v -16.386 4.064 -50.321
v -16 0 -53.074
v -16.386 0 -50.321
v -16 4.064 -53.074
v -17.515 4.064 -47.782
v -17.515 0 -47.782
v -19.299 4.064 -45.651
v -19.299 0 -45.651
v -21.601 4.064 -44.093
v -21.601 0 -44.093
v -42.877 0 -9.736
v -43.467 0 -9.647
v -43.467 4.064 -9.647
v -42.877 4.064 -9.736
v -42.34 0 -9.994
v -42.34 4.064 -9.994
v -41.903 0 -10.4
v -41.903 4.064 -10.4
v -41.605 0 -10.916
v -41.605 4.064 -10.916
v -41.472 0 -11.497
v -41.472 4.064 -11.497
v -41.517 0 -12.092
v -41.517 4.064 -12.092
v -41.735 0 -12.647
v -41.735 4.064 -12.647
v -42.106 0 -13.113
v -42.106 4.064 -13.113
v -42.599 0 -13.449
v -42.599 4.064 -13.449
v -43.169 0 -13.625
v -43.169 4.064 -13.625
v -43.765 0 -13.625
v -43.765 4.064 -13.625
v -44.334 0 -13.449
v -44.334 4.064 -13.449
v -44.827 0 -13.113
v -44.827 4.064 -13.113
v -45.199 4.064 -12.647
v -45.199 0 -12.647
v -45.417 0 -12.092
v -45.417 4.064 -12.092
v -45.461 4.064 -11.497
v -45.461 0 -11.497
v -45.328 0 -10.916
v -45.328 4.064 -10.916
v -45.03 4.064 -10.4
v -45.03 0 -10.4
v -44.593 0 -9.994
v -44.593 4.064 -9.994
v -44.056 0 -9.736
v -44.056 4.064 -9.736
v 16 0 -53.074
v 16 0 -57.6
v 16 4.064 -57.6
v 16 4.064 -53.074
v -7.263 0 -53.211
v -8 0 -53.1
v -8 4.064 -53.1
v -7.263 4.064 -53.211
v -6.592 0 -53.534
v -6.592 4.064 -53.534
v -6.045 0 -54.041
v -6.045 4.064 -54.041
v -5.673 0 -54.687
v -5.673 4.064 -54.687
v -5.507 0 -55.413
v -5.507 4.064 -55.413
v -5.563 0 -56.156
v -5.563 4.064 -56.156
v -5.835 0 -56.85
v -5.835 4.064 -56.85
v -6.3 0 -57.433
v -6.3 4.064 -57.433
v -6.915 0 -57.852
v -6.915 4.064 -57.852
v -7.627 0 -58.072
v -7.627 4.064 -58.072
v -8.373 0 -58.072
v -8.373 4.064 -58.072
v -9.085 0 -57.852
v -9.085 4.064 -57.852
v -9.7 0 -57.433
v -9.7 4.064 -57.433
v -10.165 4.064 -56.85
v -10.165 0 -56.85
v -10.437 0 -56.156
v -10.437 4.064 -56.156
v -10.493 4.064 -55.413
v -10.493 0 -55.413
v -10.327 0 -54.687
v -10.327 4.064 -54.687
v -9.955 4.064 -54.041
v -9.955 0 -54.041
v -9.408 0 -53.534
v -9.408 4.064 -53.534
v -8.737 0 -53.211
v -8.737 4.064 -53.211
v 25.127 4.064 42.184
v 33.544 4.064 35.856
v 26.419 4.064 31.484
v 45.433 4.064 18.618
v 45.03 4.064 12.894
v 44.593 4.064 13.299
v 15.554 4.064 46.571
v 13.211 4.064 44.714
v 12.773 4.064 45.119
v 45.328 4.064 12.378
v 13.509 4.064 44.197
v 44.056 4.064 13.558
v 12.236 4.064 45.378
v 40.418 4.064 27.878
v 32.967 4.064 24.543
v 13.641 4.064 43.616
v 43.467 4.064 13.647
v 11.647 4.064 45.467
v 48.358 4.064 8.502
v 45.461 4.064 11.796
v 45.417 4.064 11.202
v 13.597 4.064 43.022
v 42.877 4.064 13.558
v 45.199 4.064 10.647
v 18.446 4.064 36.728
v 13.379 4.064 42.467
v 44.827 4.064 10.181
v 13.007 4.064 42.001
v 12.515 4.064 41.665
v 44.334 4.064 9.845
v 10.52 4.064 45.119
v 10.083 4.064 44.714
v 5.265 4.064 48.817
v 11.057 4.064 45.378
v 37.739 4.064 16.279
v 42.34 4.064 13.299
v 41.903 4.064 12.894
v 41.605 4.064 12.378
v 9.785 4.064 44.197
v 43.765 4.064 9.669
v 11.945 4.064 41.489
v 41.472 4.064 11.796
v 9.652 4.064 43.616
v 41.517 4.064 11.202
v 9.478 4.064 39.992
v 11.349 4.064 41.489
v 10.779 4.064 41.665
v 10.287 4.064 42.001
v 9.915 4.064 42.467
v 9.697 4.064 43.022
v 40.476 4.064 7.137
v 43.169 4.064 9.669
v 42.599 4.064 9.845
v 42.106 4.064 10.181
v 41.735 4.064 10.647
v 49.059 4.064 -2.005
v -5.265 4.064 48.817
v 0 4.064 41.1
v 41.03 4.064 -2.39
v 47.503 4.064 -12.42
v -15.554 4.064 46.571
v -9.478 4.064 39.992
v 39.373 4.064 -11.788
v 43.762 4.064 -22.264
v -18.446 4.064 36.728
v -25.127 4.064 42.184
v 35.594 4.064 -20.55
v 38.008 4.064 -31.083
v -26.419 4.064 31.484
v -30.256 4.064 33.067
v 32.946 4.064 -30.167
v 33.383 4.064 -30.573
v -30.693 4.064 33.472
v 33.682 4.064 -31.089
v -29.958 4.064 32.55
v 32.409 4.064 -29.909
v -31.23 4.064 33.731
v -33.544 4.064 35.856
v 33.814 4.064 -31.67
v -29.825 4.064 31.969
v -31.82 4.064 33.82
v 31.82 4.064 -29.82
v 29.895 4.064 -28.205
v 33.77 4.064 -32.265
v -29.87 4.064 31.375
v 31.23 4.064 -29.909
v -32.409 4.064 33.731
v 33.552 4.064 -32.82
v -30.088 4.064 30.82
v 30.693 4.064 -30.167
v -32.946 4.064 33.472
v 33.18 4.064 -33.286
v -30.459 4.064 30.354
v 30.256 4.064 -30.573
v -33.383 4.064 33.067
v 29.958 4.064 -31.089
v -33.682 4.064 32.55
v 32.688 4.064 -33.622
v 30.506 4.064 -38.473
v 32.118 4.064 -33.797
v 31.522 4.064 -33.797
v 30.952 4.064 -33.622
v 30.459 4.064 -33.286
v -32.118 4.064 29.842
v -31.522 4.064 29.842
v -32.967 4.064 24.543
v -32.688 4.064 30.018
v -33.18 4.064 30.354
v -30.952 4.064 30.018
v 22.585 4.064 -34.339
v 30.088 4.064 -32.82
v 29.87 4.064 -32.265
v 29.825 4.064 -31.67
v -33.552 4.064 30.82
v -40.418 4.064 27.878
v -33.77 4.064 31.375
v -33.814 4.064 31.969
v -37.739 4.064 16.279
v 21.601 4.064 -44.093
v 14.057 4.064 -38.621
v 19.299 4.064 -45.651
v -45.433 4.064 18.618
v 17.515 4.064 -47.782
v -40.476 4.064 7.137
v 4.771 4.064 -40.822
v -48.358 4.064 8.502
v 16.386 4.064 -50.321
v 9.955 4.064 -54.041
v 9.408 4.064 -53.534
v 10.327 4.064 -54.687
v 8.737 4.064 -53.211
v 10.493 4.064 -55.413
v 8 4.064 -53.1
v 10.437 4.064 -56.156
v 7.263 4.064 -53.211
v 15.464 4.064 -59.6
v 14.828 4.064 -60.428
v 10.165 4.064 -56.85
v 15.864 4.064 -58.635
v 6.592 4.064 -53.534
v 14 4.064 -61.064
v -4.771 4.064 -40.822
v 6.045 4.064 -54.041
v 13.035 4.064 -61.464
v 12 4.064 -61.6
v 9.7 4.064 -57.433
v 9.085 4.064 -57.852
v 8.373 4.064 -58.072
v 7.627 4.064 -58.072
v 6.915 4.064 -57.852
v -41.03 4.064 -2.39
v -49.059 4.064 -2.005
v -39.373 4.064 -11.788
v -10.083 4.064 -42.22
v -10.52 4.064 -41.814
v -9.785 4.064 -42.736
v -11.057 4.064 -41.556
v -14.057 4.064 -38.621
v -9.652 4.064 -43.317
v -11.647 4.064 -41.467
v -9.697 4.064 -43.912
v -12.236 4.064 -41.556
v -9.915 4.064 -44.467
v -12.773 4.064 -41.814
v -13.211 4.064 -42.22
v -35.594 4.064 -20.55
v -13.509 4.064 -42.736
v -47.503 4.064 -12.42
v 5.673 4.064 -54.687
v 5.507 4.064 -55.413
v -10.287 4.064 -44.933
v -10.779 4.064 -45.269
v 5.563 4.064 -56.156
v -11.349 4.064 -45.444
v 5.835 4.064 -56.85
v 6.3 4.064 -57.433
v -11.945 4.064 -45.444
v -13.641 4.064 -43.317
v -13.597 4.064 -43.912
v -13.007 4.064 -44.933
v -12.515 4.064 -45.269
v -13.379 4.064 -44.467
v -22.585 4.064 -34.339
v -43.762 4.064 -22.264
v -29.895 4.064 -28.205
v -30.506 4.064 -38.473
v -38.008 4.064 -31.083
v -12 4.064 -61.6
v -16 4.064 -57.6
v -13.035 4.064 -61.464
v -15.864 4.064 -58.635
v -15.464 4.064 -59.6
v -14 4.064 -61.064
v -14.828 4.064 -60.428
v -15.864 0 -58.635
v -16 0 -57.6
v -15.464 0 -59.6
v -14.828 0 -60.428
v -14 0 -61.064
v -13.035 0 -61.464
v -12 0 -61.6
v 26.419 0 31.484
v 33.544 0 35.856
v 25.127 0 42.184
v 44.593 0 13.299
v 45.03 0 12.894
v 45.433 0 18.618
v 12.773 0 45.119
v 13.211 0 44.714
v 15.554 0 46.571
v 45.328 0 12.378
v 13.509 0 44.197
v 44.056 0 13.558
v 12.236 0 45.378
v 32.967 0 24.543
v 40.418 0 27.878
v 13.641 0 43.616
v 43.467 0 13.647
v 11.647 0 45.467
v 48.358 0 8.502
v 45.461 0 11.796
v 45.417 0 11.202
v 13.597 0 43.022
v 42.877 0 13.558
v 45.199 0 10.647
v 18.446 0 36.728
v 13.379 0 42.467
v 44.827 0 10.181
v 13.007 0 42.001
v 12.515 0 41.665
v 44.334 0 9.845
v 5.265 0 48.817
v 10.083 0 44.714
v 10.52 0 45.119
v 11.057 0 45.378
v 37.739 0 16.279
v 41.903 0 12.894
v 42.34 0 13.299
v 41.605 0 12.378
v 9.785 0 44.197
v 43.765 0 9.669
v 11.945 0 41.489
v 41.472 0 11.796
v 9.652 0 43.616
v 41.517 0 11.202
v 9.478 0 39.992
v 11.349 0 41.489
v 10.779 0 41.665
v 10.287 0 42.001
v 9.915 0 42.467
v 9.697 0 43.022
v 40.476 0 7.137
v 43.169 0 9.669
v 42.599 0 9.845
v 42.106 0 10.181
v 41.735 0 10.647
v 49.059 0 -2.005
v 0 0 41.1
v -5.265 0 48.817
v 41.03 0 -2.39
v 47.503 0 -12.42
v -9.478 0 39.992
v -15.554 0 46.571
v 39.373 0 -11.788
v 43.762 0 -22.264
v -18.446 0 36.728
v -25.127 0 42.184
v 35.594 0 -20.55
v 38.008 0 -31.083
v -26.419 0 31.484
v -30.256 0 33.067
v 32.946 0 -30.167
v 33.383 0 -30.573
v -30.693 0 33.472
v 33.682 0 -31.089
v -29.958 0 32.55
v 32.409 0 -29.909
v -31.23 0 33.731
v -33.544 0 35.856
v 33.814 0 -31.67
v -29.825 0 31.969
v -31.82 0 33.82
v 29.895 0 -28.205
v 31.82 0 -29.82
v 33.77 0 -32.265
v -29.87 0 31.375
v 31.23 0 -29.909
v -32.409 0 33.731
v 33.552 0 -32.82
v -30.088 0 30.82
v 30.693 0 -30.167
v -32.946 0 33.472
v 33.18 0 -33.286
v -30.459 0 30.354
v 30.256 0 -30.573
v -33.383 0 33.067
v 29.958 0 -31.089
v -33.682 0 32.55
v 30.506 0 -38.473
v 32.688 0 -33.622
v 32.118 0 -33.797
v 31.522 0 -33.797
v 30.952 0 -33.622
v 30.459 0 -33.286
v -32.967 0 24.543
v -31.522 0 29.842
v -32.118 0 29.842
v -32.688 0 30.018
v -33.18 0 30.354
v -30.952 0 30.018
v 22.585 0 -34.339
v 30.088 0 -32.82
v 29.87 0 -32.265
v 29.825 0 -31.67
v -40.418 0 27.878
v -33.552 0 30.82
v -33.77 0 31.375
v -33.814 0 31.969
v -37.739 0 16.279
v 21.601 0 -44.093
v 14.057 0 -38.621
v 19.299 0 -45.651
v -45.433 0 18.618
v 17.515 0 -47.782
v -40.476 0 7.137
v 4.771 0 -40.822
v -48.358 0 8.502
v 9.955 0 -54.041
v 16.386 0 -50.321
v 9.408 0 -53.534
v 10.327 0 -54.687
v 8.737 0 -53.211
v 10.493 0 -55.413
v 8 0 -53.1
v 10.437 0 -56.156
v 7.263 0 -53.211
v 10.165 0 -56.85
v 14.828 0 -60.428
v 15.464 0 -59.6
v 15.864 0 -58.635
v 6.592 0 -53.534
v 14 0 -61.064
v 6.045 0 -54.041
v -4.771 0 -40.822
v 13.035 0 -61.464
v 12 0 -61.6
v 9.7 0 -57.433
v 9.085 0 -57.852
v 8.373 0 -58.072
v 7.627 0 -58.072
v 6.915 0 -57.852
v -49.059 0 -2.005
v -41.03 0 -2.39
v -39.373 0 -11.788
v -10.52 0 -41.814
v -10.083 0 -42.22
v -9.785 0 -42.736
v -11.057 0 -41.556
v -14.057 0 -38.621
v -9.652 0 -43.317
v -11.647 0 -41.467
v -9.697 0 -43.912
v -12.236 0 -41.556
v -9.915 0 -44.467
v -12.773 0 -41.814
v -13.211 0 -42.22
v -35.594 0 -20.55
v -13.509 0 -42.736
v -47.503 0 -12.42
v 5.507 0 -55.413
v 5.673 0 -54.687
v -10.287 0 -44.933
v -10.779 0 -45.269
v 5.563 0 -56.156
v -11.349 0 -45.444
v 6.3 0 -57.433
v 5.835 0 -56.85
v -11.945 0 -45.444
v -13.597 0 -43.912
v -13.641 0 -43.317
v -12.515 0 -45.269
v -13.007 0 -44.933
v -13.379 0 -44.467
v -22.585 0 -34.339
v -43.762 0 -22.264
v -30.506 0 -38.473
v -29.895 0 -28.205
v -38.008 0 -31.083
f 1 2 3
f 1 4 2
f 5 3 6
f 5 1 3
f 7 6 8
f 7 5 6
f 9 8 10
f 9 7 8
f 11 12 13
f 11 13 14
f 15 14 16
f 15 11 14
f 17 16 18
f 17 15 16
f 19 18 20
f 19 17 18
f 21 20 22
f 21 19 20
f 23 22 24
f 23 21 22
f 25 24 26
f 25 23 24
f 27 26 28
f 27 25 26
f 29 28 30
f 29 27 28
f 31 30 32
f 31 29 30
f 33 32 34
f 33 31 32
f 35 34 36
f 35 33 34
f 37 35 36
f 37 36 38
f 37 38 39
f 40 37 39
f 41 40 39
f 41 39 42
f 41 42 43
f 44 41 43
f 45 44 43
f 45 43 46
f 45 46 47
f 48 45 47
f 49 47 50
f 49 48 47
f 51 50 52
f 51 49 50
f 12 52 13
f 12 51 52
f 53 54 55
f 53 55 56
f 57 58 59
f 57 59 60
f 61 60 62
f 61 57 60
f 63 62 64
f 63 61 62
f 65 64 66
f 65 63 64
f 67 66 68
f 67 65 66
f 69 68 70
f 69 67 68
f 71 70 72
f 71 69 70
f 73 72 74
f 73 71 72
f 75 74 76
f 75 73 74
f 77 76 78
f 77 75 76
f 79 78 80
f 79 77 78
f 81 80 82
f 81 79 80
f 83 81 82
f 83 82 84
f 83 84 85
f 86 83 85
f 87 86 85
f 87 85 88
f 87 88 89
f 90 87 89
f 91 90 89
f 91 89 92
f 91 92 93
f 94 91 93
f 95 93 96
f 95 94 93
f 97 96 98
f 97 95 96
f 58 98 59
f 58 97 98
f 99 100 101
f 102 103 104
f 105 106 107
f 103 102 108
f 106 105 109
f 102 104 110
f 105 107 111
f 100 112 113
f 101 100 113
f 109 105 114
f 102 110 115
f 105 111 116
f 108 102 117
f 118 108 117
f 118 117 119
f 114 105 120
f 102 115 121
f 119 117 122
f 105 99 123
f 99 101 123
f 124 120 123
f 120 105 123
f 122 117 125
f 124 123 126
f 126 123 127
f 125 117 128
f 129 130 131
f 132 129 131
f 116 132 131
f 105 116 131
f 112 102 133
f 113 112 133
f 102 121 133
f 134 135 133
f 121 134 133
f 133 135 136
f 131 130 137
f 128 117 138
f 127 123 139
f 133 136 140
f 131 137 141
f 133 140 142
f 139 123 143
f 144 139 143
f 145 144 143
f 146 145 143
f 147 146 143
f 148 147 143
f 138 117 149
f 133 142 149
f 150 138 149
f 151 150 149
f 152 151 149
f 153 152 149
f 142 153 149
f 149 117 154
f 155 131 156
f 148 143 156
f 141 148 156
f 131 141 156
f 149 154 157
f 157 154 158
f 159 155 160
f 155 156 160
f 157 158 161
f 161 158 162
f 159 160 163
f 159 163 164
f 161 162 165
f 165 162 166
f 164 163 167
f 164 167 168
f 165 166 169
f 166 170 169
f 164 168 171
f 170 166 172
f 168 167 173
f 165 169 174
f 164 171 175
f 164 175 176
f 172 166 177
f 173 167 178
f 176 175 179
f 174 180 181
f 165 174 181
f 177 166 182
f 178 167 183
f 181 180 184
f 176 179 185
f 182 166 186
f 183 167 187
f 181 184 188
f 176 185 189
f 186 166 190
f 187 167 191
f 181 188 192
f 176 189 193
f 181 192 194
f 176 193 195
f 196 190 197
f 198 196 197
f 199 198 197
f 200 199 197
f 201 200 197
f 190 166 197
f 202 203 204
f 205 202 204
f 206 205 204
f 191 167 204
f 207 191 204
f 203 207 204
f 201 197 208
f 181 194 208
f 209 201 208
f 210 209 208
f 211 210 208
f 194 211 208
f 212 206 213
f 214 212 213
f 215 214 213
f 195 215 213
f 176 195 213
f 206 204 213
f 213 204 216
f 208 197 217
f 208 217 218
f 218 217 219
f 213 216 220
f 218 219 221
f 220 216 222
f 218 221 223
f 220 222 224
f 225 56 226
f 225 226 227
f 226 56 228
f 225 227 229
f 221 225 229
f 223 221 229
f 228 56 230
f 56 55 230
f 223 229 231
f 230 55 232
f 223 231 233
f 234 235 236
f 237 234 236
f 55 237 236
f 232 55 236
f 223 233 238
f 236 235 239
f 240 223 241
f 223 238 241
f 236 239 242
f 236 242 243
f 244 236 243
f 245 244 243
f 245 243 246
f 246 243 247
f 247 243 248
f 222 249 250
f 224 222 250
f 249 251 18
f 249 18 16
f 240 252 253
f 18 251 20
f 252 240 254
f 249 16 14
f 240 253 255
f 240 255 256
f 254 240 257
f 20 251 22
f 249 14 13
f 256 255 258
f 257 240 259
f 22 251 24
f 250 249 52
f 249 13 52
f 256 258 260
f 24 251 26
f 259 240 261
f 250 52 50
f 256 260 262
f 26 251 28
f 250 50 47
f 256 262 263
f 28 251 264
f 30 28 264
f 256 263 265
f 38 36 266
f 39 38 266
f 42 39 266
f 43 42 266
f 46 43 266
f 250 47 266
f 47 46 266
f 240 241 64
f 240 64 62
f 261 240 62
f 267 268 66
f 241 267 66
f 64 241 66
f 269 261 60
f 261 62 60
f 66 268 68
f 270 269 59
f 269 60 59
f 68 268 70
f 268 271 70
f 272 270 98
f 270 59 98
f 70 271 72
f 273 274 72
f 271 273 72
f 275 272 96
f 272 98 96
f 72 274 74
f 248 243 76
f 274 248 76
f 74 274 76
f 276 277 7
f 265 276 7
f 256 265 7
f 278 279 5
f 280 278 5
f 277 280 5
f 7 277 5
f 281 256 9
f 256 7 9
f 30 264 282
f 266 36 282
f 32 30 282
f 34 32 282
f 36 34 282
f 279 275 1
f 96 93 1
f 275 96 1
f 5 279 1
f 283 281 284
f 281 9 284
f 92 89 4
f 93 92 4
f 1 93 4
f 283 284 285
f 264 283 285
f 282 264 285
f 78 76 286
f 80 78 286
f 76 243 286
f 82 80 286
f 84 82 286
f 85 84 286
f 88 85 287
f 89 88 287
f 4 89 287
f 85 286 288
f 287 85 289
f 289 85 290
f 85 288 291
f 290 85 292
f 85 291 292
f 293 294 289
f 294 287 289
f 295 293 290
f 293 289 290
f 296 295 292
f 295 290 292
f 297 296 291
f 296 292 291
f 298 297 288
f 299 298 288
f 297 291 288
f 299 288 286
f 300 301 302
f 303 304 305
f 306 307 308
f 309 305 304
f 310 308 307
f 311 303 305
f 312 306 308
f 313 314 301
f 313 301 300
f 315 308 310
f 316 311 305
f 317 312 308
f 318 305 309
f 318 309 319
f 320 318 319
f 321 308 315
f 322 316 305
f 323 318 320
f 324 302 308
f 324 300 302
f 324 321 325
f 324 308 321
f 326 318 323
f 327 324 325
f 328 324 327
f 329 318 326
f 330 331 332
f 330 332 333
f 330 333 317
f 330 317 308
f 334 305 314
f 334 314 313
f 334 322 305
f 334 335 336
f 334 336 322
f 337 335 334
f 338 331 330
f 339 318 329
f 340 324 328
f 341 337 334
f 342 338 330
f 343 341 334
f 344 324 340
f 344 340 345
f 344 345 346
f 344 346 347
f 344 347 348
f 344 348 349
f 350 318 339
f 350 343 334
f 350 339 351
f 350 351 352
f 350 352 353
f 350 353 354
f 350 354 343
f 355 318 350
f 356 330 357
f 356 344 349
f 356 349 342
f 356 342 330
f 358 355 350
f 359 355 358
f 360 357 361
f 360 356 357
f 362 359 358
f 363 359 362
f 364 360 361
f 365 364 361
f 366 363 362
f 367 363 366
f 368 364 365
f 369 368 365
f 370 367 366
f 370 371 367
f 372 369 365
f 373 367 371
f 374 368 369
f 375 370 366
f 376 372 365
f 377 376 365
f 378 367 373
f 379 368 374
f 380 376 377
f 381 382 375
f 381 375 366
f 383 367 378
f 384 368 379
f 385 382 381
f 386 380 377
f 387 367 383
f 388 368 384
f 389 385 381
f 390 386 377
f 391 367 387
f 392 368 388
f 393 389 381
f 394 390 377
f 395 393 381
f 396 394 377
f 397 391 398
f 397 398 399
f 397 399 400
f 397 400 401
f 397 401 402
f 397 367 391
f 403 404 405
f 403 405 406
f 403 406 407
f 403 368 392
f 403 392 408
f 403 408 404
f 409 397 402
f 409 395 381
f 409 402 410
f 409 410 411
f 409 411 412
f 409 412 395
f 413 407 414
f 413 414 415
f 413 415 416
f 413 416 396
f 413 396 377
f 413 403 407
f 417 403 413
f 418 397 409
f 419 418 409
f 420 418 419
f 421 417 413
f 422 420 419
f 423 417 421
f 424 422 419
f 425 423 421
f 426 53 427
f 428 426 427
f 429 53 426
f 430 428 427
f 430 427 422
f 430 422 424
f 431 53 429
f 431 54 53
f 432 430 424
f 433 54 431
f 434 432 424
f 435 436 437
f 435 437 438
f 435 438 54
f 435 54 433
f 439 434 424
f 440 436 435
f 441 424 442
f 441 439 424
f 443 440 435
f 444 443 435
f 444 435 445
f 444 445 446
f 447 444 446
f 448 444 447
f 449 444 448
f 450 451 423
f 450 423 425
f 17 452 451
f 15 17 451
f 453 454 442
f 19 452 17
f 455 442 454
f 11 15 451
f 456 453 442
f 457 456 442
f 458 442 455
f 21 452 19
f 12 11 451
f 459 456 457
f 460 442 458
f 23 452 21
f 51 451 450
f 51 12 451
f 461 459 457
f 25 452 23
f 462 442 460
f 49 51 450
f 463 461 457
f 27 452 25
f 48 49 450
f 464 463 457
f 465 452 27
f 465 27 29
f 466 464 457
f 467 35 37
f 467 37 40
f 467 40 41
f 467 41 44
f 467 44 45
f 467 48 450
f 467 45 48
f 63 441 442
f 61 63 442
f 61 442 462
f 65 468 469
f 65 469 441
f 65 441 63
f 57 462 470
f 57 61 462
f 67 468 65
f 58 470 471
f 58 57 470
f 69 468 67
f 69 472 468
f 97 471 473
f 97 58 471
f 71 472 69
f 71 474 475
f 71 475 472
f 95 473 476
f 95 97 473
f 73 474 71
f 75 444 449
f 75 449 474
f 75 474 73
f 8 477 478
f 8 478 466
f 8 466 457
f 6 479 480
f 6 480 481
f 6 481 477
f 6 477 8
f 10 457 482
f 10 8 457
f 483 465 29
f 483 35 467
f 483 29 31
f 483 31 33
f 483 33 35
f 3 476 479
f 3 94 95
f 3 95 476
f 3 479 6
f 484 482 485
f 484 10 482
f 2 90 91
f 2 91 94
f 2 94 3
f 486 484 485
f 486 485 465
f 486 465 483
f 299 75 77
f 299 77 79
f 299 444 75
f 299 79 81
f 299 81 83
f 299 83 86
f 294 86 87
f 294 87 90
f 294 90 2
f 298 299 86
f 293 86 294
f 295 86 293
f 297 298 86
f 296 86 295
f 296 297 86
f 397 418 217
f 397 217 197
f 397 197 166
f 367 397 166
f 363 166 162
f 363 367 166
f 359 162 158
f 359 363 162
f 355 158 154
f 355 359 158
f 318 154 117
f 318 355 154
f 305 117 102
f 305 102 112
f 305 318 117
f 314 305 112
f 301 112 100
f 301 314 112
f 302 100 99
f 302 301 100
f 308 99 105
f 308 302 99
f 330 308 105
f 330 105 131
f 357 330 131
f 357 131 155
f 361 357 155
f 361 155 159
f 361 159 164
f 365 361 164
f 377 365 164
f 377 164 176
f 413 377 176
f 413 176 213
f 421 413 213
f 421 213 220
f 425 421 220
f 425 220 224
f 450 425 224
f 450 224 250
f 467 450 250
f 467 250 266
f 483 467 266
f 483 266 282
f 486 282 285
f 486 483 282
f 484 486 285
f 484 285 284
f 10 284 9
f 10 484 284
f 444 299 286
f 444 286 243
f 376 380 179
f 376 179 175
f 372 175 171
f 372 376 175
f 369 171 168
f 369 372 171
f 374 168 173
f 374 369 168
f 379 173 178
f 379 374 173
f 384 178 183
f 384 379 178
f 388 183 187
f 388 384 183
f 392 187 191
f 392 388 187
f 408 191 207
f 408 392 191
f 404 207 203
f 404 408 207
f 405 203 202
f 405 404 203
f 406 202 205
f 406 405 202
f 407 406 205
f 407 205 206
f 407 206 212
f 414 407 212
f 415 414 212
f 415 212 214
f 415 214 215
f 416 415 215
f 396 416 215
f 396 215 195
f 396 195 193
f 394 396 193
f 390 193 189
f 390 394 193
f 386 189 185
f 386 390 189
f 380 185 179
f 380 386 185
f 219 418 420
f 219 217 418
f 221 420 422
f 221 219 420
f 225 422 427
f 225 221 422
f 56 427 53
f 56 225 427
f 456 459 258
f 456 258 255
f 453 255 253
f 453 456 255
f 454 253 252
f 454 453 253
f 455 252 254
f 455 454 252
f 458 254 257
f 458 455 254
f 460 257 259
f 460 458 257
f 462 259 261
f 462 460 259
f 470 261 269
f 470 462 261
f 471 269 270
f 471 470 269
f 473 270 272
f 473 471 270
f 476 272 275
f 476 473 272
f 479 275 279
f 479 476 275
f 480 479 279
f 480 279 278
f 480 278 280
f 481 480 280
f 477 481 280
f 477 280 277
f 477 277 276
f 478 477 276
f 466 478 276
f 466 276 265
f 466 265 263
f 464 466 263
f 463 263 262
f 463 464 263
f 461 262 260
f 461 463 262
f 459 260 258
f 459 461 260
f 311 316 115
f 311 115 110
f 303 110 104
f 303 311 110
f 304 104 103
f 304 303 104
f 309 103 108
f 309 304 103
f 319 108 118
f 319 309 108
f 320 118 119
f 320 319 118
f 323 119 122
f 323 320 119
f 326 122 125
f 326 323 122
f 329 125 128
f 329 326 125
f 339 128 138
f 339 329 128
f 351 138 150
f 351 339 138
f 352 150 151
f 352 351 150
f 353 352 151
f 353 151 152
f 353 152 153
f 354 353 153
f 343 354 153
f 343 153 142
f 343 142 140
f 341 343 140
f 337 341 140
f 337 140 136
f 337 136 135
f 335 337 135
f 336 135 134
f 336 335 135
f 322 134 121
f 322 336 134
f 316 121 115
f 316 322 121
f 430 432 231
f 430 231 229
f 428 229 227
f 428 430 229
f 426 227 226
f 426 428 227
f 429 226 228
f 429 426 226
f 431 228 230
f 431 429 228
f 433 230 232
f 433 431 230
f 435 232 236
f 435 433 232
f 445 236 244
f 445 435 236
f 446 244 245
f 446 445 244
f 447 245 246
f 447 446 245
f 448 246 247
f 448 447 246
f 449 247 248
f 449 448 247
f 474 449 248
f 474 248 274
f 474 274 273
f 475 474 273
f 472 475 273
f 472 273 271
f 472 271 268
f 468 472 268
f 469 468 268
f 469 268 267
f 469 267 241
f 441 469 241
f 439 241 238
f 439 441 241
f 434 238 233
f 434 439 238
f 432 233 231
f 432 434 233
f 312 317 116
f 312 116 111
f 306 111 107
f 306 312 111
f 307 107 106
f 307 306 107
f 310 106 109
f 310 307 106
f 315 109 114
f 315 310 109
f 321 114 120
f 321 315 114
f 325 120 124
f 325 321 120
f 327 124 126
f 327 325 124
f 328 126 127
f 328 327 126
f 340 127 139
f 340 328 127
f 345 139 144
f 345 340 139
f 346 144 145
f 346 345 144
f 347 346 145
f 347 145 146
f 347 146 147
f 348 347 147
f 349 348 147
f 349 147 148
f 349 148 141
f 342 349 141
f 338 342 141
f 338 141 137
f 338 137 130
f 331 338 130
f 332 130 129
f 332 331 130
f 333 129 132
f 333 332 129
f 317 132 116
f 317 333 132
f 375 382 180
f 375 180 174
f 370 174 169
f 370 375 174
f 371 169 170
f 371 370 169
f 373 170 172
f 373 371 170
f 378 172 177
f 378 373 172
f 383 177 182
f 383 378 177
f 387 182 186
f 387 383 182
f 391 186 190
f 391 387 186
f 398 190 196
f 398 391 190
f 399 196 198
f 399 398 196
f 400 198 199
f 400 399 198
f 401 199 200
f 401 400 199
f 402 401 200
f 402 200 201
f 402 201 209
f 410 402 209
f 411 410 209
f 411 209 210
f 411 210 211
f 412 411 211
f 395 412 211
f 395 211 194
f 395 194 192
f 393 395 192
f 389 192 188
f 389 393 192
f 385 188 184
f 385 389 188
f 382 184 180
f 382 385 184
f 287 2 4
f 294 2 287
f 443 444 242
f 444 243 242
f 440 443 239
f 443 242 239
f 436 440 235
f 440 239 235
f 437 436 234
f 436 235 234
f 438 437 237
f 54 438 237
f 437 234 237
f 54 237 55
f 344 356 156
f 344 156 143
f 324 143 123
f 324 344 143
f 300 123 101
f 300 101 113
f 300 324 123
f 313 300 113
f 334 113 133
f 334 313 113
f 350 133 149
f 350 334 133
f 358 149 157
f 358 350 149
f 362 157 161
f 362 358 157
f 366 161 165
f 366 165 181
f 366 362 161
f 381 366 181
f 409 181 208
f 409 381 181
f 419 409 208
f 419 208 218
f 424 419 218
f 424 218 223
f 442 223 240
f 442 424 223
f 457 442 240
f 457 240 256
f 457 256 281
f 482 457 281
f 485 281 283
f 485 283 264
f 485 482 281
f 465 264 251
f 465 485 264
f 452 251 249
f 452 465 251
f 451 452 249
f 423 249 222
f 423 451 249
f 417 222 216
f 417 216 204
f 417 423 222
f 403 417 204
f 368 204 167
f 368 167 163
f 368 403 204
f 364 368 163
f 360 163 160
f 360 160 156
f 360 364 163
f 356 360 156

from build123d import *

# Parameters (mm, degrees)
SKETCH1_R           = 41.1
SKETCH1_R_2         = 2
SKETCH1_R_3         = 2.5
BOSS_EXTRUDE2_DEPTH = 4.064
FILLET1_R           = 4
FILLET2_R           = 10


with BuildPart() as part:
    # Sketch1 → Boss-Extrude2 (new body)
    with BuildSketch(Plane(origin=(0, 0, 0), x_dir=(1, 0, 0), z_dir=(0, 1, 0))):
        with BuildLine():
            Line((-16, 46.419931064), (-16, 61.6))
            Line((-16, 61.6), (16, 61.6))
            Line((16, 61.6), (16, 46.419931064))
            ThreePointArc((16, 46.419931064), (0, -49.1), (-16, 46.419931064))
        make_face()
        with Locations(Location((0, 0, 0), (0, 0, 270))):
            Circle(SKETCH1_R, mode=Mode.SUBTRACT)
        with Locations(Location((-11.64685703, 43.466662183, 0), (0, 0, 270))):
            Circle(SKETCH1_R_2, mode=Mode.SUBTRACT)
        with Locations(Location((31.819805153, 31.819805153, 0), (0, 0, 270))):
            Circle(SKETCH1_R_2, mode=Mode.SUBTRACT)
        with Locations(Location((43.466662183, -11.64685703, 0), (0, 0, 270))):
            Circle(SKETCH1_R_2, mode=Mode.SUBTRACT)
        with Locations(Location((11.64685703, -43.466662183, 0), (0, 0, 270))):
            Circle(SKETCH1_R_2, mode=Mode.SUBTRACT)
        with Locations(Location((-31.819805153, -31.819805153, 0), (0, 0, 270))):
            Circle(SKETCH1_R_2, mode=Mode.SUBTRACT)
        with Locations(Location((-43.466662183, 11.64685703, 0), (0, 0, 270))):
            Circle(SKETCH1_R_2, mode=Mode.SUBTRACT)
        with Locations(Location((-8, 55.6, 0), (0, 0, 270))):
            Circle(SKETCH1_R_3, mode=Mode.SUBTRACT)
        with Locations(Location((8, 55.6, 0), (0, 0, 270))):
            Circle(SKETCH1_R_3, mode=Mode.SUBTRACT)
    extrude(amount=BOSS_EXTRUDE2_DEPTH)

    # Fillet1
    fillet1_edges = [part.edges().sort_by_distance(p)[0] for p in [
        (-16, 2.032, -61.6),
        (16, 2.032, -61.6),
    ]]
    fillet(fillet1_edges, radius=FILLET1_R)

    # Fillet2
    fillet2_edges = [part.edges().sort_by_distance(p)[0] for p in [
        (16, 2.032, -46.419931064),
        (-16, 2.032, -46.419931064),
    ]]
    fillet(fillet2_edges, radius=FILLET2_R)


solid = part.part
